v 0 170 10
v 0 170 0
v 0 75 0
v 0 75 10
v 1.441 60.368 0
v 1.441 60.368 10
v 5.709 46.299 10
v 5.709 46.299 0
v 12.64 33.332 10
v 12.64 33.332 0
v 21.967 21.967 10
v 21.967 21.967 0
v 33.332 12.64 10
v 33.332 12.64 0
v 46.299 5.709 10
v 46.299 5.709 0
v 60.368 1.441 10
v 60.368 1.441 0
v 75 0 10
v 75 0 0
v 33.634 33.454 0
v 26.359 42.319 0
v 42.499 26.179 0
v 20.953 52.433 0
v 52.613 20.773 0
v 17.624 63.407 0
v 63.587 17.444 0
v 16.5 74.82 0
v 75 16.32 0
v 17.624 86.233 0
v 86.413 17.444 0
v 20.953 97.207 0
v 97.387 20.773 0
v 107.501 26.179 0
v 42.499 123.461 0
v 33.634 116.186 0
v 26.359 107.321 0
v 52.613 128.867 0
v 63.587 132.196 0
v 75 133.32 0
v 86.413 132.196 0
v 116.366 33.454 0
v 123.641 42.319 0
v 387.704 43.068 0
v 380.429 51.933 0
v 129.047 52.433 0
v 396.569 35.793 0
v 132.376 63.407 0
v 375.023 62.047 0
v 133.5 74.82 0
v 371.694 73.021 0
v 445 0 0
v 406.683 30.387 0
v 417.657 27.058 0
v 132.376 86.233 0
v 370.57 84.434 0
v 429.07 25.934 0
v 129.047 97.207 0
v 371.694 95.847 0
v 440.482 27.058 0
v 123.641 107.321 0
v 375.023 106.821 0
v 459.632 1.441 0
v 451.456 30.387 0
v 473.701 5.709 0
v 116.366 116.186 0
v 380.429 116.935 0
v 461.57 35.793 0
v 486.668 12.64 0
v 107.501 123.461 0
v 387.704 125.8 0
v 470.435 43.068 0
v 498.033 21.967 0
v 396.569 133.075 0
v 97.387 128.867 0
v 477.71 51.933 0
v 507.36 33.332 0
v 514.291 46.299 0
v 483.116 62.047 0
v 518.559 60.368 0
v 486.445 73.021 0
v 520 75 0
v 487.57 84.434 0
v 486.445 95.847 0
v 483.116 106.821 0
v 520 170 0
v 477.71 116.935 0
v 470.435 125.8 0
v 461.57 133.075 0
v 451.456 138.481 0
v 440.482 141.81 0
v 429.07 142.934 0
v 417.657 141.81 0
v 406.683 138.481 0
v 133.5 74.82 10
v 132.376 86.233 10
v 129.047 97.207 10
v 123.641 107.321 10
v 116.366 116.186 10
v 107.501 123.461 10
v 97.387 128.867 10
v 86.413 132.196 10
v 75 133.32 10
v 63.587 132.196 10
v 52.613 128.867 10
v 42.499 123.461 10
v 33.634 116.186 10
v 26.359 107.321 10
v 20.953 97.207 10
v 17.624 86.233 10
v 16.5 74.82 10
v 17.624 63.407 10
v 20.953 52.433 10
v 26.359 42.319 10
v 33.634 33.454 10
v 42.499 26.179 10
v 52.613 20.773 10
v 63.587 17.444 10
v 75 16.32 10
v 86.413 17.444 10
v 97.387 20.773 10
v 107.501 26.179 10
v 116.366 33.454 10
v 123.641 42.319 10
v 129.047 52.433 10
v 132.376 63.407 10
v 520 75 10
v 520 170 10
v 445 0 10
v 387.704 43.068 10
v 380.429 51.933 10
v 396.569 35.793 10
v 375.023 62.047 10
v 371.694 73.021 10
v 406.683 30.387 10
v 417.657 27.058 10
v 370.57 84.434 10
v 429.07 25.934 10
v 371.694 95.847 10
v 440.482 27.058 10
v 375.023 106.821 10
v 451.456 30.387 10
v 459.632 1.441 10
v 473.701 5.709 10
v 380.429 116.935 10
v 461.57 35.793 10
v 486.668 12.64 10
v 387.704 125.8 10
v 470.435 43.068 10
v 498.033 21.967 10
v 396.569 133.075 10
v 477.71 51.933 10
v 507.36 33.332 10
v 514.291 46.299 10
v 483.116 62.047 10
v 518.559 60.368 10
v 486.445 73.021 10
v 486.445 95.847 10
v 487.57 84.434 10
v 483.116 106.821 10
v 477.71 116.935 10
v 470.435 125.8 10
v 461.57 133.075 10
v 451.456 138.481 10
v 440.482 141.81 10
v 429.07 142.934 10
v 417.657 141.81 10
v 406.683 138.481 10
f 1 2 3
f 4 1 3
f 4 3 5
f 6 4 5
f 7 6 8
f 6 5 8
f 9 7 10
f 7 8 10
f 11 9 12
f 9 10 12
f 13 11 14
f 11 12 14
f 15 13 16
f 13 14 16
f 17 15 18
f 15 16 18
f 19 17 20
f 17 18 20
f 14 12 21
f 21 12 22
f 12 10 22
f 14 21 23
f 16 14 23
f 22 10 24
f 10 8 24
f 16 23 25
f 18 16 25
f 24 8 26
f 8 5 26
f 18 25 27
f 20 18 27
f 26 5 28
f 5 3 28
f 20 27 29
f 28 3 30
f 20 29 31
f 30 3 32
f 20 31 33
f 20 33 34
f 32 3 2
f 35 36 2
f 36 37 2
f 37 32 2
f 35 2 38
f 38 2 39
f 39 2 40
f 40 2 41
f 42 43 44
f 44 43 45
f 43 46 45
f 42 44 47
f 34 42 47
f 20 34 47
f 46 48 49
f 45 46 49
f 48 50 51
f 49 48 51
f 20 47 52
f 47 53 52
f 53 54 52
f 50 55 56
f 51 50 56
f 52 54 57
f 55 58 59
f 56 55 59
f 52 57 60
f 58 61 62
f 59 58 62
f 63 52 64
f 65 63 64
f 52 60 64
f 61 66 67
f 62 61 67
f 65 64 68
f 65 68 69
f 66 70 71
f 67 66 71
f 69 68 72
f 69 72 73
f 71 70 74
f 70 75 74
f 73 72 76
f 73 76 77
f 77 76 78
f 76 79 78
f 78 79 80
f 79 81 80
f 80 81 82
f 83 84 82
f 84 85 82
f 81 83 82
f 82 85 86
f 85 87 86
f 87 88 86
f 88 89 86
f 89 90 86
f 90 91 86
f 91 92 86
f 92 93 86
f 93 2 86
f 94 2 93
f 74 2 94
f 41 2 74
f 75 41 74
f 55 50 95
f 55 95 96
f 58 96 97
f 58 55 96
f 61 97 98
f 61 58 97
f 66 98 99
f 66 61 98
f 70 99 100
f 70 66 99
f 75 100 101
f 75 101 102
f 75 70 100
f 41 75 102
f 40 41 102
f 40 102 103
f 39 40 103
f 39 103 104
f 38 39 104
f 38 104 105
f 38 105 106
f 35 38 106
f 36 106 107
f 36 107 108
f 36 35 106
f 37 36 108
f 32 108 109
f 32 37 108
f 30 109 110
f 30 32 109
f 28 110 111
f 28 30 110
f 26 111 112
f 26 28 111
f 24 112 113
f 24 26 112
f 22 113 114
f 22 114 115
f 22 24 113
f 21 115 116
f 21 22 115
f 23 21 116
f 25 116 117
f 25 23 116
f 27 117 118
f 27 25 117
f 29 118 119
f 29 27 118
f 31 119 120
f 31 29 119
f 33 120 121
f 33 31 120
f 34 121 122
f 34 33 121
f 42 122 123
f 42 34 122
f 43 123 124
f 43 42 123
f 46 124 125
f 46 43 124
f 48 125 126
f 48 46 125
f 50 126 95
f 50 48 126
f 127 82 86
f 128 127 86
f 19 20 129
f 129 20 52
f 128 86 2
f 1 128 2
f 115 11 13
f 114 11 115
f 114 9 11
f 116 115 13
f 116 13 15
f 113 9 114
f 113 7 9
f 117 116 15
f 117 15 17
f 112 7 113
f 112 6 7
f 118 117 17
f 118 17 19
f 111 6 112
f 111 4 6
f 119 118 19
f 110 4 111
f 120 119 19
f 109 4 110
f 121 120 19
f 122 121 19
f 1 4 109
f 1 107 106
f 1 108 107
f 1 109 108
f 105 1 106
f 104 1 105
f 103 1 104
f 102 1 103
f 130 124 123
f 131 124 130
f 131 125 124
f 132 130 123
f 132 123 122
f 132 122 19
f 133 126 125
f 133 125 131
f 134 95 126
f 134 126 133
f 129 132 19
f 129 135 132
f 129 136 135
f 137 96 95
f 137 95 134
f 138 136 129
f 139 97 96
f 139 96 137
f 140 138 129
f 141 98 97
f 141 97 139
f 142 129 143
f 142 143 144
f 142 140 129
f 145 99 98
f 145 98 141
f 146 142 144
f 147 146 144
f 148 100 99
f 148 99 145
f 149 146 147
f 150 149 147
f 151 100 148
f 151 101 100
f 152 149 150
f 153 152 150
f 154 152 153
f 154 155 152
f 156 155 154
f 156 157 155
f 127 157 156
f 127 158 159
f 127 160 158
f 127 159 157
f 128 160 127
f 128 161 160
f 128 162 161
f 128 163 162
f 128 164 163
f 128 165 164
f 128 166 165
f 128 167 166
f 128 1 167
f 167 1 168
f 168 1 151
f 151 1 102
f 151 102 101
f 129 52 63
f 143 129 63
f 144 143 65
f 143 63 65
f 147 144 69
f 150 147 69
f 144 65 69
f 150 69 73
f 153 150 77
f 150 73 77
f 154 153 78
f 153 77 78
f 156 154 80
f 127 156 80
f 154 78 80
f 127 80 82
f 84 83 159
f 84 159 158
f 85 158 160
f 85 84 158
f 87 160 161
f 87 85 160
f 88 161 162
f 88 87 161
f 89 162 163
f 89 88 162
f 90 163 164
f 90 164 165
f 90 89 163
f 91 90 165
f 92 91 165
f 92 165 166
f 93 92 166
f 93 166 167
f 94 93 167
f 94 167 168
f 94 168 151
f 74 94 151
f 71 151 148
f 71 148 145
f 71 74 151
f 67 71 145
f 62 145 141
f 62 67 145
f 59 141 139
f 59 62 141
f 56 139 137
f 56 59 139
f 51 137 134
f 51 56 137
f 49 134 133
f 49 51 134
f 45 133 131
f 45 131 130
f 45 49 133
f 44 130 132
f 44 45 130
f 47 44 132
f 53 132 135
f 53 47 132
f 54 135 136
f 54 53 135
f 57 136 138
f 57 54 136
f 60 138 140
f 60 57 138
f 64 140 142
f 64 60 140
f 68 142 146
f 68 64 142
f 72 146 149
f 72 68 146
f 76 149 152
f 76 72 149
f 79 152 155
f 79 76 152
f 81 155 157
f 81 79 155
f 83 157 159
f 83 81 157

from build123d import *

# Parameters (mm, degrees)
SKETCH_R  = 58.5
PAD_DEPTH = 10


with BuildPart() as part:
    # Sketch → Pad (new body)
    with BuildSketch(Plane.XY):
        with BuildLine():
            Line((75, 0), (445, 0))
            ThreePointArc((445, 0), (498.033009, 21.966991), (520, 75))
            Line((520, 75), (520, 170))
            Line((520, 170), (0, 170))
            Line((0, 170), (0, 75))
            ThreePointArc((0, 75), (21.966991, 21.966991), (75, 0))
        make_face()
        with Locations((75, 74.82)):
            Circle(SKETCH_R, mode=Mode.SUBTRACT)
        with Locations((429.0695, 84.434)):
            Circle(SKETCH_R, mode=Mode.SUBTRACT)
    extrude(amount=PAD_DEPTH)


solid = part.part
